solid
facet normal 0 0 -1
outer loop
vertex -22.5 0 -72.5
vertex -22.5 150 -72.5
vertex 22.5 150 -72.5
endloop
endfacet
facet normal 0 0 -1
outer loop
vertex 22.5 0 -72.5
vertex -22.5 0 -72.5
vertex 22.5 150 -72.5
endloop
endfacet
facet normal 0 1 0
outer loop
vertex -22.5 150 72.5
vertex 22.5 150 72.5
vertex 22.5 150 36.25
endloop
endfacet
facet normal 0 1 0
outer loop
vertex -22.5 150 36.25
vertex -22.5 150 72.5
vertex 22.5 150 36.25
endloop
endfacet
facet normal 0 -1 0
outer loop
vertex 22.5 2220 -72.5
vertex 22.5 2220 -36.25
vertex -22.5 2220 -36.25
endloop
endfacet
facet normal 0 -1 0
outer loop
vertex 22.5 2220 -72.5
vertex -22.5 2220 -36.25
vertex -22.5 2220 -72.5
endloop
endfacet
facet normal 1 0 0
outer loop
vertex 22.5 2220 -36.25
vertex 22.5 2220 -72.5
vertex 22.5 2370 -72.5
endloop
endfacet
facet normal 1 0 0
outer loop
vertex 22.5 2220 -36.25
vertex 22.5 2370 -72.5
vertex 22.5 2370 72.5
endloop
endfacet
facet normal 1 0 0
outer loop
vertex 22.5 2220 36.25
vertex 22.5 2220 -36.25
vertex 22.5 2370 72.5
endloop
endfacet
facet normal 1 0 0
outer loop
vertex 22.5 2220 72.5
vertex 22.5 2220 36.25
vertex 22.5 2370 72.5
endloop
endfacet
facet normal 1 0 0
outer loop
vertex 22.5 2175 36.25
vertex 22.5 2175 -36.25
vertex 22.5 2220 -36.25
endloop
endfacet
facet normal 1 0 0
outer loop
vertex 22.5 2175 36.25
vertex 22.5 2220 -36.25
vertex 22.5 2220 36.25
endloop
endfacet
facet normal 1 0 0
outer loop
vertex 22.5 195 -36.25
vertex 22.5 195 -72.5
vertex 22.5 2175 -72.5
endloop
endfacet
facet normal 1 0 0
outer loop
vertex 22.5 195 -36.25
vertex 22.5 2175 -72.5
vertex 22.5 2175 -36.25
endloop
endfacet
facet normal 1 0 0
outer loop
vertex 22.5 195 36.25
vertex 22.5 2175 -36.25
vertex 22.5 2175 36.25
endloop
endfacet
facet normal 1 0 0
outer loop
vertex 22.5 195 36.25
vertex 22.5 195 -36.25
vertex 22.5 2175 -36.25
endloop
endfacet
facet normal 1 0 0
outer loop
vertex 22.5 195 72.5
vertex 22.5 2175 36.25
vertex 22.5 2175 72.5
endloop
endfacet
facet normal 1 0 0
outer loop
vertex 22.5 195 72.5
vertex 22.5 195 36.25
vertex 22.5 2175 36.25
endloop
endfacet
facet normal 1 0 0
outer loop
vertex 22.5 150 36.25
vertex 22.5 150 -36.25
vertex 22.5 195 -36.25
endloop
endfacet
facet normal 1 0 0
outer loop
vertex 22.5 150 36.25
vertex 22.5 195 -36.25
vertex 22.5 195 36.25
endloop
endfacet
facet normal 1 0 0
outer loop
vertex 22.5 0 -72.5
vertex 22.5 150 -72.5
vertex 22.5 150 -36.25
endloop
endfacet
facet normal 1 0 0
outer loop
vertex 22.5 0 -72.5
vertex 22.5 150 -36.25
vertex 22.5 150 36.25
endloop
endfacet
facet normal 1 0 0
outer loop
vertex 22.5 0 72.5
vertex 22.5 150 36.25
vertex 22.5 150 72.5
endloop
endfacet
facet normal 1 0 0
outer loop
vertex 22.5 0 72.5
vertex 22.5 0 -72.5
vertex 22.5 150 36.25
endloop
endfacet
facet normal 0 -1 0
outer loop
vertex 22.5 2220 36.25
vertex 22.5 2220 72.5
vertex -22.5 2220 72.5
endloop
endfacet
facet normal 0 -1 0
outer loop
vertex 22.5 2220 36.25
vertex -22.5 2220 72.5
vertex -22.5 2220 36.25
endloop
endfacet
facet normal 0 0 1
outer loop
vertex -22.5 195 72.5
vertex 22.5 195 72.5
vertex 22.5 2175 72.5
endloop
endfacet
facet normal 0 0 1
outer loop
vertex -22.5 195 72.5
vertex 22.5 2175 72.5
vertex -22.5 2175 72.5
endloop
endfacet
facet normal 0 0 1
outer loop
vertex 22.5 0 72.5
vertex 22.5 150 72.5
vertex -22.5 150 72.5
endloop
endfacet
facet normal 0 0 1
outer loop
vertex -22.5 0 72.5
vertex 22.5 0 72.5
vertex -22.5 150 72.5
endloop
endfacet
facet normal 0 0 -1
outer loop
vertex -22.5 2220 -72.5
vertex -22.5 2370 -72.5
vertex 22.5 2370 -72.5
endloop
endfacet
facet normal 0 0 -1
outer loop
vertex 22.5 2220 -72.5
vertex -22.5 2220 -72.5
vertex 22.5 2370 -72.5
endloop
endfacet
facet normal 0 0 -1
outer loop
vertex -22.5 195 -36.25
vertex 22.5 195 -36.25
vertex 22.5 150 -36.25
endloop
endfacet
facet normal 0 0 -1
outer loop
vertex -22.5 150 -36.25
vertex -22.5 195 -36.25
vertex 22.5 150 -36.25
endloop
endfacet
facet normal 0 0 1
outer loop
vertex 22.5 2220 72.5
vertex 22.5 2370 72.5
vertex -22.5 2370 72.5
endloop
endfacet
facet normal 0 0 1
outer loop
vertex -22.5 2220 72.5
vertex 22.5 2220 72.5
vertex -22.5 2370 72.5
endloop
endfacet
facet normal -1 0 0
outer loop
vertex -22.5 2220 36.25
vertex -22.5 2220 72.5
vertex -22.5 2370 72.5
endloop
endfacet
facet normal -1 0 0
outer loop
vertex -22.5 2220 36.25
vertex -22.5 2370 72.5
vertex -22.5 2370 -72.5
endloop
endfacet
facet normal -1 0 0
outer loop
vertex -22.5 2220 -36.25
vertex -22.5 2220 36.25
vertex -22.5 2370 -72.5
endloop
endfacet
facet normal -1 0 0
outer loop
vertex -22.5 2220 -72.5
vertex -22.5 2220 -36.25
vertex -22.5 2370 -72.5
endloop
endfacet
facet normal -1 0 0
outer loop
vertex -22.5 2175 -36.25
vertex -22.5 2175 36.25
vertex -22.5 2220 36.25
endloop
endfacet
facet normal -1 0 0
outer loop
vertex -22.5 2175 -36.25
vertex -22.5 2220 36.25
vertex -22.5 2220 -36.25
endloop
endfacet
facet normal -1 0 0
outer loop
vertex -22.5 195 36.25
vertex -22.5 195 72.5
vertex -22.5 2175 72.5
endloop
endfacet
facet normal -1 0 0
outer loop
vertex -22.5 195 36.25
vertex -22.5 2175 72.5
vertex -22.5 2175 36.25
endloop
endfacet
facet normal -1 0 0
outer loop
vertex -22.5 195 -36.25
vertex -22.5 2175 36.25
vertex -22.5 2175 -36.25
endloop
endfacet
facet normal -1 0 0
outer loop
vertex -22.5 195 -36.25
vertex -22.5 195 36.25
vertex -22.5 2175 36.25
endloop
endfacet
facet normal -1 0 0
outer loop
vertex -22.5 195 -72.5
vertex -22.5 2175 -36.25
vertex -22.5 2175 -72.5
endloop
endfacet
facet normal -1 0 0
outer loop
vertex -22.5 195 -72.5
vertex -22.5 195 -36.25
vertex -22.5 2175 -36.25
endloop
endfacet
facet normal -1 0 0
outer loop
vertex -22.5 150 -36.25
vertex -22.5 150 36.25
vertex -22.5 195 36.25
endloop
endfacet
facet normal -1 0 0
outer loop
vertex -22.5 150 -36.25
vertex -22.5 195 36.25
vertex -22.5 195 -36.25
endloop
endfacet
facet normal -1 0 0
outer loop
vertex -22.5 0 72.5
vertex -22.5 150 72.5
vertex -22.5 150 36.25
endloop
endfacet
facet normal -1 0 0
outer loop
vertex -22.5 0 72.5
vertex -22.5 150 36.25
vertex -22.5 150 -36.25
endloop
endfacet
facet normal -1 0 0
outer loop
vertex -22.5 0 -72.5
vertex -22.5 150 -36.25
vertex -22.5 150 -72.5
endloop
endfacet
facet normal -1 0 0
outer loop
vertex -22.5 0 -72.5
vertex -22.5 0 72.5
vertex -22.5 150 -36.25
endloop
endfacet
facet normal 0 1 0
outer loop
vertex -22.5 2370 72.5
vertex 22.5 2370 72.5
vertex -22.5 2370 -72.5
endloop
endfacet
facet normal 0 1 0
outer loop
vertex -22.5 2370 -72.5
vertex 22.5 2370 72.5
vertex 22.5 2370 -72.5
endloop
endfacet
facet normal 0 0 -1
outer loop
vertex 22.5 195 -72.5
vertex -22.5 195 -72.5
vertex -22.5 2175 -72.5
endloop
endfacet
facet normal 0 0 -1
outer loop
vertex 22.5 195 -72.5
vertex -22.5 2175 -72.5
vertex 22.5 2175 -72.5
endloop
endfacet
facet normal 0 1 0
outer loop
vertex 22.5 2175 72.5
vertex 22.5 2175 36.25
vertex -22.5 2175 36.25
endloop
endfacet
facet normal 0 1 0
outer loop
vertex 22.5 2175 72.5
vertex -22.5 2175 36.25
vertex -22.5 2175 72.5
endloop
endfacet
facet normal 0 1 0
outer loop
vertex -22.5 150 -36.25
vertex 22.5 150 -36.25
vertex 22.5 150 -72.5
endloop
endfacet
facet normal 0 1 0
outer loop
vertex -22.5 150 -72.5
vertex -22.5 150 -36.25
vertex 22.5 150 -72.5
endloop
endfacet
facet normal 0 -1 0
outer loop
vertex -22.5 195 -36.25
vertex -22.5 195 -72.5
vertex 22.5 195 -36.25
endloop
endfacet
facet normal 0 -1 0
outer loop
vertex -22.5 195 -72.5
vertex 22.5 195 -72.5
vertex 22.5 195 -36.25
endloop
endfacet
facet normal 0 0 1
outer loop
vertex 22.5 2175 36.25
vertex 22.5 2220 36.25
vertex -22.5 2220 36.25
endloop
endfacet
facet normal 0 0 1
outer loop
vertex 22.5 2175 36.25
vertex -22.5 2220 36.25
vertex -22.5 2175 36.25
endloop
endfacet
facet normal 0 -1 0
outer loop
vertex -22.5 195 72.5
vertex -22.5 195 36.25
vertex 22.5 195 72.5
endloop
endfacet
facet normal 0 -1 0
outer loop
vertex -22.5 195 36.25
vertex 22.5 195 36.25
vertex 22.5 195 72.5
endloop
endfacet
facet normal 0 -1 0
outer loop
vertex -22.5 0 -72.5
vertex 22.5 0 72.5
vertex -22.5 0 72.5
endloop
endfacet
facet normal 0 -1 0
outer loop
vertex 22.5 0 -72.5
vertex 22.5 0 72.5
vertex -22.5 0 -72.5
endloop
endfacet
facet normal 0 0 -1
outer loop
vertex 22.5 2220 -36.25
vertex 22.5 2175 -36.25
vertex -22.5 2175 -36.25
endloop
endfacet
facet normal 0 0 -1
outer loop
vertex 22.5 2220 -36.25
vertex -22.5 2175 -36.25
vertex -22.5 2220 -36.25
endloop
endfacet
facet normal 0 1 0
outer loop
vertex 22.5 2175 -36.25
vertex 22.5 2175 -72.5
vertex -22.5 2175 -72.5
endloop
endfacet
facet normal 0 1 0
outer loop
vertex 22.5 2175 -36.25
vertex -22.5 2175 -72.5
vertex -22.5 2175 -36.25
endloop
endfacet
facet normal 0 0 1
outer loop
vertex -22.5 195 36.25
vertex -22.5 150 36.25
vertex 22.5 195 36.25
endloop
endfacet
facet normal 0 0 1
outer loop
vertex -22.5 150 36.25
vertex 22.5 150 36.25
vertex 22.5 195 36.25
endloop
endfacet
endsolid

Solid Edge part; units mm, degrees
sketch "Sketch1" plane through (0, 0, 0) normal (0, -1, 0) x (1, 0, 0)
  line L0 (-22.5, -72.5) -> (22.5, -72.5)
  line L1 (22.5, -72.5) -> (22.5, 72.5)
  line L2 (22.5, 72.5) -> (-22.5, 72.5)
  line L3 (-22.5, 72.5) -> (-22.5, -72.5)
extrude "Protrusion1" add sketch "Sketch1" against normal blind 2370
sketch "Sketch2" plane through (22.5, 1185, 0) normal (1, 0, 0) x (0, 1, 0)
  line L0 (1035, 72.5) -> (1035, 36.25)
  line L1 (1035, 36.25) -> (990, 36.25)
  line L2 (990, 36.25) -> (990, 72.5)
  line L3 (990, 72.5) -> (1035, 72.5)
  line L4 (-1035, 72.5) -> (-1035, 36.25)
  line L5 (-1035, 36.25) -> (-990, 36.25)
  line L6 (-990, 36.25) -> (-990, 72.5)
  line L7 (-990, 72.5) -> (-1035, 72.5)
extrude "ExtrudedCutout_1" cut sketch "Sketch2" against normal blind 89.2118
mirror "Mirror1" about plane through (0, 0, 0) normal (0, 0, -1) of "ExtrudedCutout_1"
properties material "Wood, Pine"
